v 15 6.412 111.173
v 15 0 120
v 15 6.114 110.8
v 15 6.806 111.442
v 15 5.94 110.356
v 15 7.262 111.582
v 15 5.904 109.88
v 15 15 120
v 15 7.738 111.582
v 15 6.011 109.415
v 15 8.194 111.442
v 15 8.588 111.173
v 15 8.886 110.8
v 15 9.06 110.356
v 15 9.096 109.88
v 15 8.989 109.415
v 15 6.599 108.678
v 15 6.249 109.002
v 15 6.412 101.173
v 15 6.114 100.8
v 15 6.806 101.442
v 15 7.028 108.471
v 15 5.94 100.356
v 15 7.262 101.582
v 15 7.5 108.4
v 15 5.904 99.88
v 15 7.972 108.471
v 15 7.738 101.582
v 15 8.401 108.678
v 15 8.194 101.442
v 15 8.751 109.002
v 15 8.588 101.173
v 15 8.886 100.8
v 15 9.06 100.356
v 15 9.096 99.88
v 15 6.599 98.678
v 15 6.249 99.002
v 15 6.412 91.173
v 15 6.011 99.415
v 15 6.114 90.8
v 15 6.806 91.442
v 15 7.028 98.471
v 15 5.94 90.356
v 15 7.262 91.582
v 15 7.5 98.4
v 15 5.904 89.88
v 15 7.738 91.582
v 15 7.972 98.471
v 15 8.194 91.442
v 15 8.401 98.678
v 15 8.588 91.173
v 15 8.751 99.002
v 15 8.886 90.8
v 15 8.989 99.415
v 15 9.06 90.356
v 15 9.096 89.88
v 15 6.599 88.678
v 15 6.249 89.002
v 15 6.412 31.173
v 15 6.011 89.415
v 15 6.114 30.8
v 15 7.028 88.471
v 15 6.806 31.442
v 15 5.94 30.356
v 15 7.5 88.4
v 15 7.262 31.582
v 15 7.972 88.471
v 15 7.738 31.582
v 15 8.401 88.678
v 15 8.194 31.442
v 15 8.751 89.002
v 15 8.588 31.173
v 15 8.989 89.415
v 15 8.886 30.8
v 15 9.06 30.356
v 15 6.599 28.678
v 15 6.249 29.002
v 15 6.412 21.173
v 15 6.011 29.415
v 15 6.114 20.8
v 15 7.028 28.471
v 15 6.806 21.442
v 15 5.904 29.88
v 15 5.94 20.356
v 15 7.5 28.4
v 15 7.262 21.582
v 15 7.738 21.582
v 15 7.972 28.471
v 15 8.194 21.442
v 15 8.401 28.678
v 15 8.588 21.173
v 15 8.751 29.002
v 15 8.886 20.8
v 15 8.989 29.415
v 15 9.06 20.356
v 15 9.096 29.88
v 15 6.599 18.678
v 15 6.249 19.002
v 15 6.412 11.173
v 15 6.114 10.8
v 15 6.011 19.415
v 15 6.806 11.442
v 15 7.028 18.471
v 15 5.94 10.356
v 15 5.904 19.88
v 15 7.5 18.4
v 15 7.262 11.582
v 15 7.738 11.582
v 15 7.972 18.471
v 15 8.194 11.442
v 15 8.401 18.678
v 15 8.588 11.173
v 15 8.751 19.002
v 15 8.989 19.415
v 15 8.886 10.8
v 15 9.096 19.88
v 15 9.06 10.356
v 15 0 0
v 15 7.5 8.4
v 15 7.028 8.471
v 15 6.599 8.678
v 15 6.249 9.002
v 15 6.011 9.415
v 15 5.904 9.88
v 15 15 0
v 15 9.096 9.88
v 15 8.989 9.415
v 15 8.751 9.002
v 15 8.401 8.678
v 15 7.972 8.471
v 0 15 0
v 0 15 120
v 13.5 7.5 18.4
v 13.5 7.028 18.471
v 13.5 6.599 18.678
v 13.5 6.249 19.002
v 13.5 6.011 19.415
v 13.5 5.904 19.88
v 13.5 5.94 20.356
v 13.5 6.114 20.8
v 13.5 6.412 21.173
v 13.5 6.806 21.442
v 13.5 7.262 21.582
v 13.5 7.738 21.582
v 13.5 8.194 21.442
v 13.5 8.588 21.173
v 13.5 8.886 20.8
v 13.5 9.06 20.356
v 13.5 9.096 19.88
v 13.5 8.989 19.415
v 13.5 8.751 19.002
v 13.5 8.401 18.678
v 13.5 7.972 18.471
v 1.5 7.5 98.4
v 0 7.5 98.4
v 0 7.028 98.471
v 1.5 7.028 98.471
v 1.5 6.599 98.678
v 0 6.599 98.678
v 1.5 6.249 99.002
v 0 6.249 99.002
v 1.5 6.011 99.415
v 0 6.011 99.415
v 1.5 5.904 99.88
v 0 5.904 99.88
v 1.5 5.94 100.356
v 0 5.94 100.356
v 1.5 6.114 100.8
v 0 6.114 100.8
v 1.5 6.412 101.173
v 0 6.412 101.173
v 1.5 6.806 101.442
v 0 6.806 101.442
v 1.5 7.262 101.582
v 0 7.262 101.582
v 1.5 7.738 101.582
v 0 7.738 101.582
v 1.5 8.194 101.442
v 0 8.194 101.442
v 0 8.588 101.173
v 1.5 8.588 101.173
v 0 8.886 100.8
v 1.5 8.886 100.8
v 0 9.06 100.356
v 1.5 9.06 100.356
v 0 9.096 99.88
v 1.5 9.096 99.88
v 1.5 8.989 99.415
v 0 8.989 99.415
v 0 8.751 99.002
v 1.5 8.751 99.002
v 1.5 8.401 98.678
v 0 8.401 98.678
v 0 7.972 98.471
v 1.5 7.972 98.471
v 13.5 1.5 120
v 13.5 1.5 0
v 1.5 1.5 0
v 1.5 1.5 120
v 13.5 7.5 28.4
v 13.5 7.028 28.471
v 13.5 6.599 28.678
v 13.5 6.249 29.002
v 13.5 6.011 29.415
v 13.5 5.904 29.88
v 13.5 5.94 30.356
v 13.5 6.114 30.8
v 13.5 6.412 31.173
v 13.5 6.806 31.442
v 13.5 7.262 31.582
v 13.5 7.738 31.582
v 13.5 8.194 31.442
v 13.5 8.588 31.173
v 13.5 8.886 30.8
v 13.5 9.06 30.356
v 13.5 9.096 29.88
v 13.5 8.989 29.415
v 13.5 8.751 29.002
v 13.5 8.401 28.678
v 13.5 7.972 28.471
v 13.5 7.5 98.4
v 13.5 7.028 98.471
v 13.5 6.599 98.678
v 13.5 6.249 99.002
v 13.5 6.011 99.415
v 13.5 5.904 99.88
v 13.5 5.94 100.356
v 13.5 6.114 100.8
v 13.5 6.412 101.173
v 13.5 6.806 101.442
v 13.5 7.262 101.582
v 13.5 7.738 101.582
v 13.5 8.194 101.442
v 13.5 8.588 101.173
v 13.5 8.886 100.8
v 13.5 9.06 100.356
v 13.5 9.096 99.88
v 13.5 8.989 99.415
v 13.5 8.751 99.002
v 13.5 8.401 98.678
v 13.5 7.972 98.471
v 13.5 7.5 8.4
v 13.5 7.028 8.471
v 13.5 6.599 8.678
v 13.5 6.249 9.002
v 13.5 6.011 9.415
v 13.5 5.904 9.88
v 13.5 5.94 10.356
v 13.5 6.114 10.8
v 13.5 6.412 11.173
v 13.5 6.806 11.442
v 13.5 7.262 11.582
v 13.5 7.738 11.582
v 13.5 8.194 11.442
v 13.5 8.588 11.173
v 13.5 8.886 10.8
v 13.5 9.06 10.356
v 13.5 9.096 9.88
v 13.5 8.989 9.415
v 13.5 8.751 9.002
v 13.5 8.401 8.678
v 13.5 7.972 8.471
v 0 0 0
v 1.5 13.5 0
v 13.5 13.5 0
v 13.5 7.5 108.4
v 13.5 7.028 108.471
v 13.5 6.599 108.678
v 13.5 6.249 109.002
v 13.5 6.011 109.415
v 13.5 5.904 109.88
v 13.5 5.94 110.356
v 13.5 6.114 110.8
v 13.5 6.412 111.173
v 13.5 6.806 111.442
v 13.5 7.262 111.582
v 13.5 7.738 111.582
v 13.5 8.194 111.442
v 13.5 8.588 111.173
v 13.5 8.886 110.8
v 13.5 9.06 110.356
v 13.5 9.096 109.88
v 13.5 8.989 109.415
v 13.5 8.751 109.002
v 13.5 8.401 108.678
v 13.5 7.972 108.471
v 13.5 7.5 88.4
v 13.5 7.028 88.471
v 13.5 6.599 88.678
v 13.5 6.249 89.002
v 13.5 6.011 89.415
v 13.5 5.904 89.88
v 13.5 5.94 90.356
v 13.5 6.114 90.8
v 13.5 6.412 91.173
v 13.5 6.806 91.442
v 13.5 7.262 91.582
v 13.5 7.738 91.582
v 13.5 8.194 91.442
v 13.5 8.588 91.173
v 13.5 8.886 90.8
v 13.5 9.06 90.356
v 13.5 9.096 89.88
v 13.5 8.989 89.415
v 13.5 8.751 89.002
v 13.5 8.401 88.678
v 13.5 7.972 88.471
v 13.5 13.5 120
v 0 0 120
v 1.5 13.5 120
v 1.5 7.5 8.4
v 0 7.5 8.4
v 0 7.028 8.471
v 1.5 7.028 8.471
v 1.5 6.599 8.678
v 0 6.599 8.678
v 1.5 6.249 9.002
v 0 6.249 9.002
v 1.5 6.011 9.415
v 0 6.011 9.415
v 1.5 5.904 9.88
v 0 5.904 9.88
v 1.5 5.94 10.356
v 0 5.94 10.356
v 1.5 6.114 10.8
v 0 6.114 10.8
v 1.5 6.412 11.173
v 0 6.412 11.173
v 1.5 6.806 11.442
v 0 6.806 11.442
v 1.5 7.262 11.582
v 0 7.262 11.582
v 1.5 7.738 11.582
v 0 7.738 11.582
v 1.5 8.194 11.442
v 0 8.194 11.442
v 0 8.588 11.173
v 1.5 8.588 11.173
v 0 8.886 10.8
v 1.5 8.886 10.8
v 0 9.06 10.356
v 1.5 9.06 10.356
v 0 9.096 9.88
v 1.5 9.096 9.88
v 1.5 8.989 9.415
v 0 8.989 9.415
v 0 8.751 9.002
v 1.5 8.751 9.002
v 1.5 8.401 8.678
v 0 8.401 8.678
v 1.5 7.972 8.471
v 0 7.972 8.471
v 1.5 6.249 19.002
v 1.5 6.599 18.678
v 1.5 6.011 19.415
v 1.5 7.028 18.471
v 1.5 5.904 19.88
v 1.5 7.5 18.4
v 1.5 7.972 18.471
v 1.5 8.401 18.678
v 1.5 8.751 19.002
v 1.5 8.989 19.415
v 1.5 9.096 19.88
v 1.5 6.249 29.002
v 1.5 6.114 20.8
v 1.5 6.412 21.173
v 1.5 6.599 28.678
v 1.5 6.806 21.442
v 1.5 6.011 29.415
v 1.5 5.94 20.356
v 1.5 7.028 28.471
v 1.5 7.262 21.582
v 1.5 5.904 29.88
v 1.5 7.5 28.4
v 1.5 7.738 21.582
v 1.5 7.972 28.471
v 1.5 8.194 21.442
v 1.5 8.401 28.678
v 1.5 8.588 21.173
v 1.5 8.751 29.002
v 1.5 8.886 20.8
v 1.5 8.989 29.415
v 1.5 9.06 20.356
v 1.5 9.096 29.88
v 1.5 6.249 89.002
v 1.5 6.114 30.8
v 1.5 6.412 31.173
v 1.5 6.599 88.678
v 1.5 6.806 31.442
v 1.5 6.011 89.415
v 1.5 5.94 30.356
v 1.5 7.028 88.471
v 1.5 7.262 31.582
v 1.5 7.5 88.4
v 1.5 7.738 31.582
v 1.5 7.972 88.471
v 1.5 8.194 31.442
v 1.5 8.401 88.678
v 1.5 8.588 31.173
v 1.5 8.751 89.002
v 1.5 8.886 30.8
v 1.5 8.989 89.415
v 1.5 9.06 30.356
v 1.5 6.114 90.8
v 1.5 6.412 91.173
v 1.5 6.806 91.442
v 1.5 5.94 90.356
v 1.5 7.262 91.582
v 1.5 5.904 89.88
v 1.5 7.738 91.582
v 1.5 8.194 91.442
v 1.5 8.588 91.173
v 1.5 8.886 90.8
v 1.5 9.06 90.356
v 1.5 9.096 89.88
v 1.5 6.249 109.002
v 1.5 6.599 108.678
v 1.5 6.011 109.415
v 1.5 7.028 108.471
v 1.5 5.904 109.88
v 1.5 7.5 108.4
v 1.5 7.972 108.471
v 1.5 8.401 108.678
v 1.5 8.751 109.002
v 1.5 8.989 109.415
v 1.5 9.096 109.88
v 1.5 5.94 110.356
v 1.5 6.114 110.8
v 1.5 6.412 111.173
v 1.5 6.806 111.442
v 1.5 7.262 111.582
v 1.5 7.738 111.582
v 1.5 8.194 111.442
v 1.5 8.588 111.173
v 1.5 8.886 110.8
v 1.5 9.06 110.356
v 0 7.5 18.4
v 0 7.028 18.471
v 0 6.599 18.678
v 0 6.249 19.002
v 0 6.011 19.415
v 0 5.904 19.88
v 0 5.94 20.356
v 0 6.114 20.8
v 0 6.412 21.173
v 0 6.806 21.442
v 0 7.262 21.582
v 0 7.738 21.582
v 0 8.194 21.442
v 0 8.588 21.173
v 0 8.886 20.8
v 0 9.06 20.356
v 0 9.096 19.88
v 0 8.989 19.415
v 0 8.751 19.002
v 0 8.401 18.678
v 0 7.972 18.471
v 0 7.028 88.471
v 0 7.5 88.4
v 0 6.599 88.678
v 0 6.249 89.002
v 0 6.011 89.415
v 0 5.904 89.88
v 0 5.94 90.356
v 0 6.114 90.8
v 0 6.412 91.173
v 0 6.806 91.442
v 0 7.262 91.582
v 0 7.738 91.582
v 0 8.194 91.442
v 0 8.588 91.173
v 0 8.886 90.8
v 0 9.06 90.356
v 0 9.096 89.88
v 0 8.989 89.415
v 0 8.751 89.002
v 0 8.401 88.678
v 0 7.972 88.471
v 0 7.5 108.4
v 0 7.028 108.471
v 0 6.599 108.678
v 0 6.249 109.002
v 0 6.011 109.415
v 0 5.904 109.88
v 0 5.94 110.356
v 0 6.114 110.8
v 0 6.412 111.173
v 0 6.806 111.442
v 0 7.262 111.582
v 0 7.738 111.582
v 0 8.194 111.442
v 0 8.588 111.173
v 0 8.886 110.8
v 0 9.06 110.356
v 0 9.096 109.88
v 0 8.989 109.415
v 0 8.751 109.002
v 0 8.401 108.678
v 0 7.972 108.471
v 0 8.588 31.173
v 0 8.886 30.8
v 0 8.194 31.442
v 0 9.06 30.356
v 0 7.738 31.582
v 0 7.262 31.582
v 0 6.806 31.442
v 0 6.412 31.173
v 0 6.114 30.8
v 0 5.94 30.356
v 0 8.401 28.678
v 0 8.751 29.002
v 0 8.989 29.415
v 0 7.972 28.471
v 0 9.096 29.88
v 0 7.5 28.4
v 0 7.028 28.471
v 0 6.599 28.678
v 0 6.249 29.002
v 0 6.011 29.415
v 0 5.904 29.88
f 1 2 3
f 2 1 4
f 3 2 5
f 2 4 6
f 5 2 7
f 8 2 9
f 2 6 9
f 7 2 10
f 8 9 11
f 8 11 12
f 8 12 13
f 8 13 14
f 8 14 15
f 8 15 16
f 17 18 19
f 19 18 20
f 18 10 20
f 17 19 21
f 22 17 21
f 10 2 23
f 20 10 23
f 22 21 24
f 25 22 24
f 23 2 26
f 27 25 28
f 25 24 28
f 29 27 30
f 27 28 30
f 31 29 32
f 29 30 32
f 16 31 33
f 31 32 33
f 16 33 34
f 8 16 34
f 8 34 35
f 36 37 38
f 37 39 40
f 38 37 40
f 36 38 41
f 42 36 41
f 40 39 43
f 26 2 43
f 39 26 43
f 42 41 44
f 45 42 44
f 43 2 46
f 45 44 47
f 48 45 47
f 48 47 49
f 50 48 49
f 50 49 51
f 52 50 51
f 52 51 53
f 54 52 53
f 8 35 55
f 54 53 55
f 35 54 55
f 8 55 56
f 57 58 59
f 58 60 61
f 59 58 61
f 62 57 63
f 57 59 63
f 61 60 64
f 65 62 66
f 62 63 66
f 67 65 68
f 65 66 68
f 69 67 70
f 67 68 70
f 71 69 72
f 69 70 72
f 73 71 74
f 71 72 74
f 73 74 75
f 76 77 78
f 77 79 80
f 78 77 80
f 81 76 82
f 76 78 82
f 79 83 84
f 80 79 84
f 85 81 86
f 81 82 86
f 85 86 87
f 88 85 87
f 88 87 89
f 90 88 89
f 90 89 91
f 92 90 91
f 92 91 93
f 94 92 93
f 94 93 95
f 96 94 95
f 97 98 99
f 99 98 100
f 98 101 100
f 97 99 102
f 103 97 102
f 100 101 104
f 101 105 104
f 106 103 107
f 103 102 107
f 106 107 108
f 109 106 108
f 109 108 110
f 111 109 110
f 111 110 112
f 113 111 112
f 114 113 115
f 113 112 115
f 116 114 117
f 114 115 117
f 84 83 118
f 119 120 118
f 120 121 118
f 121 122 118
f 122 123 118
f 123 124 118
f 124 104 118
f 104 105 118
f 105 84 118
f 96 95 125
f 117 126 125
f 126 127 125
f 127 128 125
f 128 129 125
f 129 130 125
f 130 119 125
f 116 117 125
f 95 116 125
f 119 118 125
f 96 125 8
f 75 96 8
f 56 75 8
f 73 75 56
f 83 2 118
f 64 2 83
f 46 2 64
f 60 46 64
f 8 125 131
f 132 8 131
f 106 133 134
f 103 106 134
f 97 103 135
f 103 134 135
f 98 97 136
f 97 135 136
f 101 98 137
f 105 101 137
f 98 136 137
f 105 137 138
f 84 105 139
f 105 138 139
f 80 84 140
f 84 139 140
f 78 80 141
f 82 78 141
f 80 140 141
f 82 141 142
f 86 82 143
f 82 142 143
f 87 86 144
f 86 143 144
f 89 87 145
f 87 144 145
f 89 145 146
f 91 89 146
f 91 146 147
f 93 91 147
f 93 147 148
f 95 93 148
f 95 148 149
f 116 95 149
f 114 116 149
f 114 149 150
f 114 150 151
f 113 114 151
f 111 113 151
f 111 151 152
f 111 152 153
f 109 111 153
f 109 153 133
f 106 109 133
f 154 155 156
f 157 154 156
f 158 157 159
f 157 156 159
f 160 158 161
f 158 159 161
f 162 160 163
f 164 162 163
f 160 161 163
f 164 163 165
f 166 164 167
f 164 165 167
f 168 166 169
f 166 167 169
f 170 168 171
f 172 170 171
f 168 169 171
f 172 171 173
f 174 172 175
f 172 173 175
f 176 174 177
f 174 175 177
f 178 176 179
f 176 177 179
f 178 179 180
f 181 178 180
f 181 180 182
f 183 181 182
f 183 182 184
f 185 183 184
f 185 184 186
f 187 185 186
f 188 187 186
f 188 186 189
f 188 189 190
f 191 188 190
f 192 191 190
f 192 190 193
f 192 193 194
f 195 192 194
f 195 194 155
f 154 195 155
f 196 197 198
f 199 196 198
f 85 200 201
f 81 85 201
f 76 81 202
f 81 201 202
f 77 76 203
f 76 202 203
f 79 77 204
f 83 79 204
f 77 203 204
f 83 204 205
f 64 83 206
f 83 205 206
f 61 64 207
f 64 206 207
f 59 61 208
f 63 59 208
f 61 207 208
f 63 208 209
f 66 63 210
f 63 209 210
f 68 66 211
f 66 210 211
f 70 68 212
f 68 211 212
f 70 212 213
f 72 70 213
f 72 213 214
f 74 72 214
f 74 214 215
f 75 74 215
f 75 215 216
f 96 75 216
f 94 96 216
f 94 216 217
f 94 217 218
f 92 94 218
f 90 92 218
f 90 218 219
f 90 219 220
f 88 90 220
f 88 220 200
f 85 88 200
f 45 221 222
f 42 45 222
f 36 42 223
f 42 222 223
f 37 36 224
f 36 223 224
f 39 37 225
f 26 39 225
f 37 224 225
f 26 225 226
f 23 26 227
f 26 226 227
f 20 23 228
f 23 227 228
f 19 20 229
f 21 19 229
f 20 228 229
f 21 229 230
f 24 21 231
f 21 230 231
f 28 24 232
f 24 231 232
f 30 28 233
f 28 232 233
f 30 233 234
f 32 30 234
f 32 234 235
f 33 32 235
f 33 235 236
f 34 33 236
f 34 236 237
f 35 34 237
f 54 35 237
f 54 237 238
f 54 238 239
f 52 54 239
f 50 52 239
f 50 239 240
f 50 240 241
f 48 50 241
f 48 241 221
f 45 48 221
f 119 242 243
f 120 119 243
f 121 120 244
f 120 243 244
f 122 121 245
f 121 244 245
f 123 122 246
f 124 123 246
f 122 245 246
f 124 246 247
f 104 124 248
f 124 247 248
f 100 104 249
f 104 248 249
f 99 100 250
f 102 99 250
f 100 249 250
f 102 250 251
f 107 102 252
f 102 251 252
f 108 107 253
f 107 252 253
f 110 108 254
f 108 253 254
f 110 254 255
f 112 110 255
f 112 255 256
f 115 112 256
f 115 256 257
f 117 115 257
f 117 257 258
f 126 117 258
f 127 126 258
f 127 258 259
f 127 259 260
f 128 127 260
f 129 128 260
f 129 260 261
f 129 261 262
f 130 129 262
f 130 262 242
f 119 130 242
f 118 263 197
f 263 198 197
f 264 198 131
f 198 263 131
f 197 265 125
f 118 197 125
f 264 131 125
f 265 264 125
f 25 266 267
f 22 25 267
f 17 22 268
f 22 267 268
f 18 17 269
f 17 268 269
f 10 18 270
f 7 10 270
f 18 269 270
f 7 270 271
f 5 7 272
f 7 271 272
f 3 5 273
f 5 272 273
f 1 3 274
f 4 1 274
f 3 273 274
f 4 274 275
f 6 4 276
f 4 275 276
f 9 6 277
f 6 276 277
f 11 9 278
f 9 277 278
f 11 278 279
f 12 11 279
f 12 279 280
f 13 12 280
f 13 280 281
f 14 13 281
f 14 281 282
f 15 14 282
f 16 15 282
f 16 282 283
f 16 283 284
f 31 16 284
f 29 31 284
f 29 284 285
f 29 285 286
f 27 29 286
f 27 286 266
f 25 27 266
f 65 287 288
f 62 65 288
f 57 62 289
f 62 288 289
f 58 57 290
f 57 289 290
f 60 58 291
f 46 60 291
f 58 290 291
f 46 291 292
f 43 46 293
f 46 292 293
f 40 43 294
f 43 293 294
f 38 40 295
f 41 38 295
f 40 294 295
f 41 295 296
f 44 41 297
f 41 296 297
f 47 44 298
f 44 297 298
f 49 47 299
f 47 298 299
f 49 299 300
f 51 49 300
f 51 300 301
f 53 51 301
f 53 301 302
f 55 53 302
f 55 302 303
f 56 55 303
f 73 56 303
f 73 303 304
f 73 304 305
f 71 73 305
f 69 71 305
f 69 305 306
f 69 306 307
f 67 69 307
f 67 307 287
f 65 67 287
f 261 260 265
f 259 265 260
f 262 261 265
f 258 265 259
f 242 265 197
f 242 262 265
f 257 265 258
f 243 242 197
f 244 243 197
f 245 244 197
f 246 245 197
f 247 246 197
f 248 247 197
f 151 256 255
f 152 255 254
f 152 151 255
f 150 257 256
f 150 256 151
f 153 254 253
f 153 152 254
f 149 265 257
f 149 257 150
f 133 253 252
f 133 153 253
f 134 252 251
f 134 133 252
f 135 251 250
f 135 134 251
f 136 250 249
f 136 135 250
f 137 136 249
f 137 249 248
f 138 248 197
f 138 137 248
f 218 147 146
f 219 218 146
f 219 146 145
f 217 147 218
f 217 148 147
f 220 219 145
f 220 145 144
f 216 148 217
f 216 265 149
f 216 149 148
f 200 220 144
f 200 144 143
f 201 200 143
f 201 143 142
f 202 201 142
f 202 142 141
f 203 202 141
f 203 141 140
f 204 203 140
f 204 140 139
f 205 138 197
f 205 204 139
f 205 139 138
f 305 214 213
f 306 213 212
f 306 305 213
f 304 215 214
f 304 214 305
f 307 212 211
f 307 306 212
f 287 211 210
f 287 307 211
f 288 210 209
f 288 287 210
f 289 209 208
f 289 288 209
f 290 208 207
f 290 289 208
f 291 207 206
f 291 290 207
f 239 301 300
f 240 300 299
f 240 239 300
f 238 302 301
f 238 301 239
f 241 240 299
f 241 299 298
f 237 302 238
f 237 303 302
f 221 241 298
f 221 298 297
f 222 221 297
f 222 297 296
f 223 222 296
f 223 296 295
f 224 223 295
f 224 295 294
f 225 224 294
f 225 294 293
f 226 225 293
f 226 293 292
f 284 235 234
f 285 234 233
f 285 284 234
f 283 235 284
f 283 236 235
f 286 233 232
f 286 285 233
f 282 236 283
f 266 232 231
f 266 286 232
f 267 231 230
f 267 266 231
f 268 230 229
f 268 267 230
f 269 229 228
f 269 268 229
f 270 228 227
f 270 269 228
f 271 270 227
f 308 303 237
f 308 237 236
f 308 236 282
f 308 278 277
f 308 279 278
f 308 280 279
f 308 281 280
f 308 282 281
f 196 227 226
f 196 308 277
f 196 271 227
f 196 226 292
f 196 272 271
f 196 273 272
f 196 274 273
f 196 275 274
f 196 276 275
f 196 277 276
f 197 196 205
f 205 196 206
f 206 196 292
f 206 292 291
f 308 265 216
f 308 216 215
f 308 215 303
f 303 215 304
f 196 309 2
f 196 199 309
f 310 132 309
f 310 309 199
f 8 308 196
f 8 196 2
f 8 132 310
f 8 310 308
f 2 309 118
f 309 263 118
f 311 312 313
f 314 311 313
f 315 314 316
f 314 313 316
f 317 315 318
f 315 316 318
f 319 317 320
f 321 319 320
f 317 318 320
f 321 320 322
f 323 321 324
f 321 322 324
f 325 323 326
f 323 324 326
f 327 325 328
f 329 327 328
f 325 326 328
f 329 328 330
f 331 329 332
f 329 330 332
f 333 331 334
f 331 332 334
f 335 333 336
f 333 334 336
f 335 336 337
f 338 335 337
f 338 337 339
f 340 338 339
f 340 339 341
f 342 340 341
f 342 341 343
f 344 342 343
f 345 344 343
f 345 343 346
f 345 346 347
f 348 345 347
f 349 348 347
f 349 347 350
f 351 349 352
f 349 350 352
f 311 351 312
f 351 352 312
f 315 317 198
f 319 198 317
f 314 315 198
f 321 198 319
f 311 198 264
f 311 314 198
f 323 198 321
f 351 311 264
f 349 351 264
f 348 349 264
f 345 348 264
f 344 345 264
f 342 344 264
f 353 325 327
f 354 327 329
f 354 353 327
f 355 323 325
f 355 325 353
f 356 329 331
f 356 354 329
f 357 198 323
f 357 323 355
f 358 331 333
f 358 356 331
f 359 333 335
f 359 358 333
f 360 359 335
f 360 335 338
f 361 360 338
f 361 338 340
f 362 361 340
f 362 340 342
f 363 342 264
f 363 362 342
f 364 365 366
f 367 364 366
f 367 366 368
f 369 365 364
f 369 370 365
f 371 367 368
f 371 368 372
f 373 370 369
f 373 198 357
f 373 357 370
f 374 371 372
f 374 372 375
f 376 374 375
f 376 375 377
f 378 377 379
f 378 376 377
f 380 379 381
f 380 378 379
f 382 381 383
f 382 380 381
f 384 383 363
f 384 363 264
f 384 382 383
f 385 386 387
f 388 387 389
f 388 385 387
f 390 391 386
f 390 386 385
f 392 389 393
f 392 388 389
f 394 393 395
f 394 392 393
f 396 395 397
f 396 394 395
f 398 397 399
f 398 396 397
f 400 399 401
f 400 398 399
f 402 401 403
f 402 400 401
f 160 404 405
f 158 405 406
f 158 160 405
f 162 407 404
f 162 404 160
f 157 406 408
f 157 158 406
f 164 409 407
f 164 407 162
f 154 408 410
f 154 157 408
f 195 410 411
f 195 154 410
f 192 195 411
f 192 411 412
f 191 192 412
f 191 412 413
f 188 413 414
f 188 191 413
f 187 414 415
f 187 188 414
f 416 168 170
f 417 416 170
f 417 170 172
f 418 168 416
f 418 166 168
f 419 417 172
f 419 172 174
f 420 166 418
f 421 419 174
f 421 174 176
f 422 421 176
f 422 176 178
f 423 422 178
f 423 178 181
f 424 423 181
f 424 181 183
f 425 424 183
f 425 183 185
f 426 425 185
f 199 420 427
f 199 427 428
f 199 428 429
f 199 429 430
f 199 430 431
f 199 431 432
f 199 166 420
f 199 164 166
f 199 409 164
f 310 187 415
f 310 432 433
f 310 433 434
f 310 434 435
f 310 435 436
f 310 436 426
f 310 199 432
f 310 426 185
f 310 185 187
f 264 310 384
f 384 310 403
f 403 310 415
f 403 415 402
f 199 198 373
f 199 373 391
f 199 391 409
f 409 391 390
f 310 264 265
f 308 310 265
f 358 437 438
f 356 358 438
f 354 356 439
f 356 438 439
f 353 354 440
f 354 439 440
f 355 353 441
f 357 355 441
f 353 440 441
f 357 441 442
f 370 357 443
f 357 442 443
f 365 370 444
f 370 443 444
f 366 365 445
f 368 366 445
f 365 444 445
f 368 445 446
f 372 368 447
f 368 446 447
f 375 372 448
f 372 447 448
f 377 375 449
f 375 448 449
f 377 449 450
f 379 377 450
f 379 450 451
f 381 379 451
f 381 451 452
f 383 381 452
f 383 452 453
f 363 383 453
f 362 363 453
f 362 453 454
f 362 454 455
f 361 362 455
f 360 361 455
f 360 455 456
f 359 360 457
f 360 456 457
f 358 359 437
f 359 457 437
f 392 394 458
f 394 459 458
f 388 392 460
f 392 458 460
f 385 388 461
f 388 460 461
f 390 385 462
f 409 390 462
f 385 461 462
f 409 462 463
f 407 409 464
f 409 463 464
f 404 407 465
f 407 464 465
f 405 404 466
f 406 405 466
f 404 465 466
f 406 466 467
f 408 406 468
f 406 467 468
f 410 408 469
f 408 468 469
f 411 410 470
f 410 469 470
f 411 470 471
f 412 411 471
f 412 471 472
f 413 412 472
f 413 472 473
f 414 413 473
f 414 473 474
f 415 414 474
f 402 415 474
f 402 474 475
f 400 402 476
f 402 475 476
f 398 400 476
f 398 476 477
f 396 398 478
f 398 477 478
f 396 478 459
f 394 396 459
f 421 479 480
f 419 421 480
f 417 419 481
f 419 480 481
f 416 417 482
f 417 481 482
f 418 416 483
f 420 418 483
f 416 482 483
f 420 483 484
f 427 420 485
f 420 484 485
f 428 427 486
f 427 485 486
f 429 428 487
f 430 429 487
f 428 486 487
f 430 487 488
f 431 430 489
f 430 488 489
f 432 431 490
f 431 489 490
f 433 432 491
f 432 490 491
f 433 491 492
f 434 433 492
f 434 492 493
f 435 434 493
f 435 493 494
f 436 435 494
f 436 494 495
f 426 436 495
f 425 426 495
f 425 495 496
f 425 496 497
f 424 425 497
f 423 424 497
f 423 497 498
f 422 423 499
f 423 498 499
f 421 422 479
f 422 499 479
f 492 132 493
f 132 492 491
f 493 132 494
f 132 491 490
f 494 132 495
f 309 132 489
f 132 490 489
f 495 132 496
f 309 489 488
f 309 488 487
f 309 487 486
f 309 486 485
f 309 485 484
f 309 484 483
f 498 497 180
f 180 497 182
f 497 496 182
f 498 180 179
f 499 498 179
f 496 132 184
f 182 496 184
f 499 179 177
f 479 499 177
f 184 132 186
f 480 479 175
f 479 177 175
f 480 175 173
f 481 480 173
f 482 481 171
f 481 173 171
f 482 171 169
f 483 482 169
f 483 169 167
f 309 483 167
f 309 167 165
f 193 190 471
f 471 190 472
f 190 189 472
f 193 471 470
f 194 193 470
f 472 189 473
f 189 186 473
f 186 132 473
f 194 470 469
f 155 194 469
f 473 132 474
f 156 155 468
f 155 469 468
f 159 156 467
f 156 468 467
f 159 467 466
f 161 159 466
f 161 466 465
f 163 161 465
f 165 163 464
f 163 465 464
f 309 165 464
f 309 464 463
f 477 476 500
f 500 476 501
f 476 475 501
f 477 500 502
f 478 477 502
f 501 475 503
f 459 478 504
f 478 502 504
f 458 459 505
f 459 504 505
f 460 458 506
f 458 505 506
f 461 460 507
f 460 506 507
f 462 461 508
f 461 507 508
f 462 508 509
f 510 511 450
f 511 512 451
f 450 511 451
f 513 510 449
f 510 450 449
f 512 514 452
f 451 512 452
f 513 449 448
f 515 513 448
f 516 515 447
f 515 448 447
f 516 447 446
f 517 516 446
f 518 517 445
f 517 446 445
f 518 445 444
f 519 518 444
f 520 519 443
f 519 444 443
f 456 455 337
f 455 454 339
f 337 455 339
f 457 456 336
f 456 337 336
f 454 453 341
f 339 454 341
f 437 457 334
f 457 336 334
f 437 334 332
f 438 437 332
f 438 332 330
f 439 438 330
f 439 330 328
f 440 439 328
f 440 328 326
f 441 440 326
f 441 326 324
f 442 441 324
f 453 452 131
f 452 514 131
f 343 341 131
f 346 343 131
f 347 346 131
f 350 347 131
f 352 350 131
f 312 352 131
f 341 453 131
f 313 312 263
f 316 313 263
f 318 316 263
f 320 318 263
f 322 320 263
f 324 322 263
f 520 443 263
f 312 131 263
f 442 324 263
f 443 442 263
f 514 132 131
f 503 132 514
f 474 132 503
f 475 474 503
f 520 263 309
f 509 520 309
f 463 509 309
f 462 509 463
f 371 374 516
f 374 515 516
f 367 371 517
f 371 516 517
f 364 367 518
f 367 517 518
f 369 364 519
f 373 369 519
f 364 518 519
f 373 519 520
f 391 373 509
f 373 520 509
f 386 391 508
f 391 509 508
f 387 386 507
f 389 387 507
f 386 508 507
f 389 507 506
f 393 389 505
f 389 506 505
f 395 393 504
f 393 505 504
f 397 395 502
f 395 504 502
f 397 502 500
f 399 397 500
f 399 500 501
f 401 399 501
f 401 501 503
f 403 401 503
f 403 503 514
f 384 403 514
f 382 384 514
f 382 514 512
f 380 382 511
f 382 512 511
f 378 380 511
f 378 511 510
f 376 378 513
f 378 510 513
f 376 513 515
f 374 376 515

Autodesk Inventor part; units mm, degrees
ref_plane "YZ Plane" through (0, 0, 0) normal (1, 0, 0) x (0, 1, 0)
ref_plane "XZ Plane" through (0, 0, 0) normal (0, 1, 0) x (-1, 0, 0)
ref_plane "XY Plane" through (0, 0, 0) normal (0, 0, 1) x (1, 0, 0)
sketch "スケッチ1" plane through (0, 0, 0) normal (0, 0, 1) x (1, 0, 0)
  line L0 (0, 0) -> (15, 0)
  line L1 (15, 0) -> (15, 15)
  line L2 (15, 15) -> (0, 15)
  line L3 (0, 15) -> (0, 0)
  dimension "d0" = 15
  dimension "d1" = 15
extrude "押し出し1" add sketch "スケッチ1" along normal blind 120
sketch "スケッチ2" plane through (0, 15, 0) normal (0, 1, 0) x (1, 0, 0)
  point P0 (0, 0)
sketch "スケッチ3" plane through (15, 0, 0) normal (1, 0, 0) x (0, 0, -1)
  line L0 (-120, 0) -> (-120, 15) projected
  line L1 (0, 0) -> (-120, 0) projected
  line L2 (0, 0) -> (0, 15) projected
  point P0 (-110, 7.5)
  point P1 (-100, 7.5)
  point P2 (-90, 7.5)
  point P3 (-30, 7.5)
  point P4 (-20, 7.5)
  point P5 (-10, 7.5)
  dimension "d4" = 10
  dimension "d5" = 7.5
  dimension "d6" = 10
  dimension "d7" = 10
  dimension "d8" = 7.5
  dimension "d9" = 7.5
  dimension "d10" = 7.5
  dimension "d11" = 30
  dimension "d12" = 20
  dimension "d13" = 7.5
  dimension "d14" = 7.5
  dimension "d15" = 10
hole "穴1" at (15, 7.5, 110) at (15, 7.5, 100) at (15, 7.5, 90) at (15, 7.5, 30) at (15, 7.5, 20) at (15, 7.5, 10) direction (-1, 0, 0) diameter 3.2 end through all
sketch "スケッチ4" plane through (0, 0, 120) normal (0, 0, 1) x (1, 0, 0)
  line L0 (1.5, 13.5) -> (13.5, 13.5)
  line L1 (13.5, 13.5) -> (13.5, 1.5)
  line L2 (13.5, 1.5) -> (1.5, 1.5)
  line L3 (1.5, 1.5) -> (1.5, 13.5)
  line L4 (15, 15) -> (0, 15) projected
  line L5 (0, 15) -> (0, 0) projected
  dimension "d23" = 12
  dimension "d24" = 12
  dimension "d25" = 1.5
  dimension "d26" = 1.5
extrude "押し出し2" cut sketch "スケッチ4" against normal blind 600
properties part number "射出_角柱12" material "アルミニウム 6061"
